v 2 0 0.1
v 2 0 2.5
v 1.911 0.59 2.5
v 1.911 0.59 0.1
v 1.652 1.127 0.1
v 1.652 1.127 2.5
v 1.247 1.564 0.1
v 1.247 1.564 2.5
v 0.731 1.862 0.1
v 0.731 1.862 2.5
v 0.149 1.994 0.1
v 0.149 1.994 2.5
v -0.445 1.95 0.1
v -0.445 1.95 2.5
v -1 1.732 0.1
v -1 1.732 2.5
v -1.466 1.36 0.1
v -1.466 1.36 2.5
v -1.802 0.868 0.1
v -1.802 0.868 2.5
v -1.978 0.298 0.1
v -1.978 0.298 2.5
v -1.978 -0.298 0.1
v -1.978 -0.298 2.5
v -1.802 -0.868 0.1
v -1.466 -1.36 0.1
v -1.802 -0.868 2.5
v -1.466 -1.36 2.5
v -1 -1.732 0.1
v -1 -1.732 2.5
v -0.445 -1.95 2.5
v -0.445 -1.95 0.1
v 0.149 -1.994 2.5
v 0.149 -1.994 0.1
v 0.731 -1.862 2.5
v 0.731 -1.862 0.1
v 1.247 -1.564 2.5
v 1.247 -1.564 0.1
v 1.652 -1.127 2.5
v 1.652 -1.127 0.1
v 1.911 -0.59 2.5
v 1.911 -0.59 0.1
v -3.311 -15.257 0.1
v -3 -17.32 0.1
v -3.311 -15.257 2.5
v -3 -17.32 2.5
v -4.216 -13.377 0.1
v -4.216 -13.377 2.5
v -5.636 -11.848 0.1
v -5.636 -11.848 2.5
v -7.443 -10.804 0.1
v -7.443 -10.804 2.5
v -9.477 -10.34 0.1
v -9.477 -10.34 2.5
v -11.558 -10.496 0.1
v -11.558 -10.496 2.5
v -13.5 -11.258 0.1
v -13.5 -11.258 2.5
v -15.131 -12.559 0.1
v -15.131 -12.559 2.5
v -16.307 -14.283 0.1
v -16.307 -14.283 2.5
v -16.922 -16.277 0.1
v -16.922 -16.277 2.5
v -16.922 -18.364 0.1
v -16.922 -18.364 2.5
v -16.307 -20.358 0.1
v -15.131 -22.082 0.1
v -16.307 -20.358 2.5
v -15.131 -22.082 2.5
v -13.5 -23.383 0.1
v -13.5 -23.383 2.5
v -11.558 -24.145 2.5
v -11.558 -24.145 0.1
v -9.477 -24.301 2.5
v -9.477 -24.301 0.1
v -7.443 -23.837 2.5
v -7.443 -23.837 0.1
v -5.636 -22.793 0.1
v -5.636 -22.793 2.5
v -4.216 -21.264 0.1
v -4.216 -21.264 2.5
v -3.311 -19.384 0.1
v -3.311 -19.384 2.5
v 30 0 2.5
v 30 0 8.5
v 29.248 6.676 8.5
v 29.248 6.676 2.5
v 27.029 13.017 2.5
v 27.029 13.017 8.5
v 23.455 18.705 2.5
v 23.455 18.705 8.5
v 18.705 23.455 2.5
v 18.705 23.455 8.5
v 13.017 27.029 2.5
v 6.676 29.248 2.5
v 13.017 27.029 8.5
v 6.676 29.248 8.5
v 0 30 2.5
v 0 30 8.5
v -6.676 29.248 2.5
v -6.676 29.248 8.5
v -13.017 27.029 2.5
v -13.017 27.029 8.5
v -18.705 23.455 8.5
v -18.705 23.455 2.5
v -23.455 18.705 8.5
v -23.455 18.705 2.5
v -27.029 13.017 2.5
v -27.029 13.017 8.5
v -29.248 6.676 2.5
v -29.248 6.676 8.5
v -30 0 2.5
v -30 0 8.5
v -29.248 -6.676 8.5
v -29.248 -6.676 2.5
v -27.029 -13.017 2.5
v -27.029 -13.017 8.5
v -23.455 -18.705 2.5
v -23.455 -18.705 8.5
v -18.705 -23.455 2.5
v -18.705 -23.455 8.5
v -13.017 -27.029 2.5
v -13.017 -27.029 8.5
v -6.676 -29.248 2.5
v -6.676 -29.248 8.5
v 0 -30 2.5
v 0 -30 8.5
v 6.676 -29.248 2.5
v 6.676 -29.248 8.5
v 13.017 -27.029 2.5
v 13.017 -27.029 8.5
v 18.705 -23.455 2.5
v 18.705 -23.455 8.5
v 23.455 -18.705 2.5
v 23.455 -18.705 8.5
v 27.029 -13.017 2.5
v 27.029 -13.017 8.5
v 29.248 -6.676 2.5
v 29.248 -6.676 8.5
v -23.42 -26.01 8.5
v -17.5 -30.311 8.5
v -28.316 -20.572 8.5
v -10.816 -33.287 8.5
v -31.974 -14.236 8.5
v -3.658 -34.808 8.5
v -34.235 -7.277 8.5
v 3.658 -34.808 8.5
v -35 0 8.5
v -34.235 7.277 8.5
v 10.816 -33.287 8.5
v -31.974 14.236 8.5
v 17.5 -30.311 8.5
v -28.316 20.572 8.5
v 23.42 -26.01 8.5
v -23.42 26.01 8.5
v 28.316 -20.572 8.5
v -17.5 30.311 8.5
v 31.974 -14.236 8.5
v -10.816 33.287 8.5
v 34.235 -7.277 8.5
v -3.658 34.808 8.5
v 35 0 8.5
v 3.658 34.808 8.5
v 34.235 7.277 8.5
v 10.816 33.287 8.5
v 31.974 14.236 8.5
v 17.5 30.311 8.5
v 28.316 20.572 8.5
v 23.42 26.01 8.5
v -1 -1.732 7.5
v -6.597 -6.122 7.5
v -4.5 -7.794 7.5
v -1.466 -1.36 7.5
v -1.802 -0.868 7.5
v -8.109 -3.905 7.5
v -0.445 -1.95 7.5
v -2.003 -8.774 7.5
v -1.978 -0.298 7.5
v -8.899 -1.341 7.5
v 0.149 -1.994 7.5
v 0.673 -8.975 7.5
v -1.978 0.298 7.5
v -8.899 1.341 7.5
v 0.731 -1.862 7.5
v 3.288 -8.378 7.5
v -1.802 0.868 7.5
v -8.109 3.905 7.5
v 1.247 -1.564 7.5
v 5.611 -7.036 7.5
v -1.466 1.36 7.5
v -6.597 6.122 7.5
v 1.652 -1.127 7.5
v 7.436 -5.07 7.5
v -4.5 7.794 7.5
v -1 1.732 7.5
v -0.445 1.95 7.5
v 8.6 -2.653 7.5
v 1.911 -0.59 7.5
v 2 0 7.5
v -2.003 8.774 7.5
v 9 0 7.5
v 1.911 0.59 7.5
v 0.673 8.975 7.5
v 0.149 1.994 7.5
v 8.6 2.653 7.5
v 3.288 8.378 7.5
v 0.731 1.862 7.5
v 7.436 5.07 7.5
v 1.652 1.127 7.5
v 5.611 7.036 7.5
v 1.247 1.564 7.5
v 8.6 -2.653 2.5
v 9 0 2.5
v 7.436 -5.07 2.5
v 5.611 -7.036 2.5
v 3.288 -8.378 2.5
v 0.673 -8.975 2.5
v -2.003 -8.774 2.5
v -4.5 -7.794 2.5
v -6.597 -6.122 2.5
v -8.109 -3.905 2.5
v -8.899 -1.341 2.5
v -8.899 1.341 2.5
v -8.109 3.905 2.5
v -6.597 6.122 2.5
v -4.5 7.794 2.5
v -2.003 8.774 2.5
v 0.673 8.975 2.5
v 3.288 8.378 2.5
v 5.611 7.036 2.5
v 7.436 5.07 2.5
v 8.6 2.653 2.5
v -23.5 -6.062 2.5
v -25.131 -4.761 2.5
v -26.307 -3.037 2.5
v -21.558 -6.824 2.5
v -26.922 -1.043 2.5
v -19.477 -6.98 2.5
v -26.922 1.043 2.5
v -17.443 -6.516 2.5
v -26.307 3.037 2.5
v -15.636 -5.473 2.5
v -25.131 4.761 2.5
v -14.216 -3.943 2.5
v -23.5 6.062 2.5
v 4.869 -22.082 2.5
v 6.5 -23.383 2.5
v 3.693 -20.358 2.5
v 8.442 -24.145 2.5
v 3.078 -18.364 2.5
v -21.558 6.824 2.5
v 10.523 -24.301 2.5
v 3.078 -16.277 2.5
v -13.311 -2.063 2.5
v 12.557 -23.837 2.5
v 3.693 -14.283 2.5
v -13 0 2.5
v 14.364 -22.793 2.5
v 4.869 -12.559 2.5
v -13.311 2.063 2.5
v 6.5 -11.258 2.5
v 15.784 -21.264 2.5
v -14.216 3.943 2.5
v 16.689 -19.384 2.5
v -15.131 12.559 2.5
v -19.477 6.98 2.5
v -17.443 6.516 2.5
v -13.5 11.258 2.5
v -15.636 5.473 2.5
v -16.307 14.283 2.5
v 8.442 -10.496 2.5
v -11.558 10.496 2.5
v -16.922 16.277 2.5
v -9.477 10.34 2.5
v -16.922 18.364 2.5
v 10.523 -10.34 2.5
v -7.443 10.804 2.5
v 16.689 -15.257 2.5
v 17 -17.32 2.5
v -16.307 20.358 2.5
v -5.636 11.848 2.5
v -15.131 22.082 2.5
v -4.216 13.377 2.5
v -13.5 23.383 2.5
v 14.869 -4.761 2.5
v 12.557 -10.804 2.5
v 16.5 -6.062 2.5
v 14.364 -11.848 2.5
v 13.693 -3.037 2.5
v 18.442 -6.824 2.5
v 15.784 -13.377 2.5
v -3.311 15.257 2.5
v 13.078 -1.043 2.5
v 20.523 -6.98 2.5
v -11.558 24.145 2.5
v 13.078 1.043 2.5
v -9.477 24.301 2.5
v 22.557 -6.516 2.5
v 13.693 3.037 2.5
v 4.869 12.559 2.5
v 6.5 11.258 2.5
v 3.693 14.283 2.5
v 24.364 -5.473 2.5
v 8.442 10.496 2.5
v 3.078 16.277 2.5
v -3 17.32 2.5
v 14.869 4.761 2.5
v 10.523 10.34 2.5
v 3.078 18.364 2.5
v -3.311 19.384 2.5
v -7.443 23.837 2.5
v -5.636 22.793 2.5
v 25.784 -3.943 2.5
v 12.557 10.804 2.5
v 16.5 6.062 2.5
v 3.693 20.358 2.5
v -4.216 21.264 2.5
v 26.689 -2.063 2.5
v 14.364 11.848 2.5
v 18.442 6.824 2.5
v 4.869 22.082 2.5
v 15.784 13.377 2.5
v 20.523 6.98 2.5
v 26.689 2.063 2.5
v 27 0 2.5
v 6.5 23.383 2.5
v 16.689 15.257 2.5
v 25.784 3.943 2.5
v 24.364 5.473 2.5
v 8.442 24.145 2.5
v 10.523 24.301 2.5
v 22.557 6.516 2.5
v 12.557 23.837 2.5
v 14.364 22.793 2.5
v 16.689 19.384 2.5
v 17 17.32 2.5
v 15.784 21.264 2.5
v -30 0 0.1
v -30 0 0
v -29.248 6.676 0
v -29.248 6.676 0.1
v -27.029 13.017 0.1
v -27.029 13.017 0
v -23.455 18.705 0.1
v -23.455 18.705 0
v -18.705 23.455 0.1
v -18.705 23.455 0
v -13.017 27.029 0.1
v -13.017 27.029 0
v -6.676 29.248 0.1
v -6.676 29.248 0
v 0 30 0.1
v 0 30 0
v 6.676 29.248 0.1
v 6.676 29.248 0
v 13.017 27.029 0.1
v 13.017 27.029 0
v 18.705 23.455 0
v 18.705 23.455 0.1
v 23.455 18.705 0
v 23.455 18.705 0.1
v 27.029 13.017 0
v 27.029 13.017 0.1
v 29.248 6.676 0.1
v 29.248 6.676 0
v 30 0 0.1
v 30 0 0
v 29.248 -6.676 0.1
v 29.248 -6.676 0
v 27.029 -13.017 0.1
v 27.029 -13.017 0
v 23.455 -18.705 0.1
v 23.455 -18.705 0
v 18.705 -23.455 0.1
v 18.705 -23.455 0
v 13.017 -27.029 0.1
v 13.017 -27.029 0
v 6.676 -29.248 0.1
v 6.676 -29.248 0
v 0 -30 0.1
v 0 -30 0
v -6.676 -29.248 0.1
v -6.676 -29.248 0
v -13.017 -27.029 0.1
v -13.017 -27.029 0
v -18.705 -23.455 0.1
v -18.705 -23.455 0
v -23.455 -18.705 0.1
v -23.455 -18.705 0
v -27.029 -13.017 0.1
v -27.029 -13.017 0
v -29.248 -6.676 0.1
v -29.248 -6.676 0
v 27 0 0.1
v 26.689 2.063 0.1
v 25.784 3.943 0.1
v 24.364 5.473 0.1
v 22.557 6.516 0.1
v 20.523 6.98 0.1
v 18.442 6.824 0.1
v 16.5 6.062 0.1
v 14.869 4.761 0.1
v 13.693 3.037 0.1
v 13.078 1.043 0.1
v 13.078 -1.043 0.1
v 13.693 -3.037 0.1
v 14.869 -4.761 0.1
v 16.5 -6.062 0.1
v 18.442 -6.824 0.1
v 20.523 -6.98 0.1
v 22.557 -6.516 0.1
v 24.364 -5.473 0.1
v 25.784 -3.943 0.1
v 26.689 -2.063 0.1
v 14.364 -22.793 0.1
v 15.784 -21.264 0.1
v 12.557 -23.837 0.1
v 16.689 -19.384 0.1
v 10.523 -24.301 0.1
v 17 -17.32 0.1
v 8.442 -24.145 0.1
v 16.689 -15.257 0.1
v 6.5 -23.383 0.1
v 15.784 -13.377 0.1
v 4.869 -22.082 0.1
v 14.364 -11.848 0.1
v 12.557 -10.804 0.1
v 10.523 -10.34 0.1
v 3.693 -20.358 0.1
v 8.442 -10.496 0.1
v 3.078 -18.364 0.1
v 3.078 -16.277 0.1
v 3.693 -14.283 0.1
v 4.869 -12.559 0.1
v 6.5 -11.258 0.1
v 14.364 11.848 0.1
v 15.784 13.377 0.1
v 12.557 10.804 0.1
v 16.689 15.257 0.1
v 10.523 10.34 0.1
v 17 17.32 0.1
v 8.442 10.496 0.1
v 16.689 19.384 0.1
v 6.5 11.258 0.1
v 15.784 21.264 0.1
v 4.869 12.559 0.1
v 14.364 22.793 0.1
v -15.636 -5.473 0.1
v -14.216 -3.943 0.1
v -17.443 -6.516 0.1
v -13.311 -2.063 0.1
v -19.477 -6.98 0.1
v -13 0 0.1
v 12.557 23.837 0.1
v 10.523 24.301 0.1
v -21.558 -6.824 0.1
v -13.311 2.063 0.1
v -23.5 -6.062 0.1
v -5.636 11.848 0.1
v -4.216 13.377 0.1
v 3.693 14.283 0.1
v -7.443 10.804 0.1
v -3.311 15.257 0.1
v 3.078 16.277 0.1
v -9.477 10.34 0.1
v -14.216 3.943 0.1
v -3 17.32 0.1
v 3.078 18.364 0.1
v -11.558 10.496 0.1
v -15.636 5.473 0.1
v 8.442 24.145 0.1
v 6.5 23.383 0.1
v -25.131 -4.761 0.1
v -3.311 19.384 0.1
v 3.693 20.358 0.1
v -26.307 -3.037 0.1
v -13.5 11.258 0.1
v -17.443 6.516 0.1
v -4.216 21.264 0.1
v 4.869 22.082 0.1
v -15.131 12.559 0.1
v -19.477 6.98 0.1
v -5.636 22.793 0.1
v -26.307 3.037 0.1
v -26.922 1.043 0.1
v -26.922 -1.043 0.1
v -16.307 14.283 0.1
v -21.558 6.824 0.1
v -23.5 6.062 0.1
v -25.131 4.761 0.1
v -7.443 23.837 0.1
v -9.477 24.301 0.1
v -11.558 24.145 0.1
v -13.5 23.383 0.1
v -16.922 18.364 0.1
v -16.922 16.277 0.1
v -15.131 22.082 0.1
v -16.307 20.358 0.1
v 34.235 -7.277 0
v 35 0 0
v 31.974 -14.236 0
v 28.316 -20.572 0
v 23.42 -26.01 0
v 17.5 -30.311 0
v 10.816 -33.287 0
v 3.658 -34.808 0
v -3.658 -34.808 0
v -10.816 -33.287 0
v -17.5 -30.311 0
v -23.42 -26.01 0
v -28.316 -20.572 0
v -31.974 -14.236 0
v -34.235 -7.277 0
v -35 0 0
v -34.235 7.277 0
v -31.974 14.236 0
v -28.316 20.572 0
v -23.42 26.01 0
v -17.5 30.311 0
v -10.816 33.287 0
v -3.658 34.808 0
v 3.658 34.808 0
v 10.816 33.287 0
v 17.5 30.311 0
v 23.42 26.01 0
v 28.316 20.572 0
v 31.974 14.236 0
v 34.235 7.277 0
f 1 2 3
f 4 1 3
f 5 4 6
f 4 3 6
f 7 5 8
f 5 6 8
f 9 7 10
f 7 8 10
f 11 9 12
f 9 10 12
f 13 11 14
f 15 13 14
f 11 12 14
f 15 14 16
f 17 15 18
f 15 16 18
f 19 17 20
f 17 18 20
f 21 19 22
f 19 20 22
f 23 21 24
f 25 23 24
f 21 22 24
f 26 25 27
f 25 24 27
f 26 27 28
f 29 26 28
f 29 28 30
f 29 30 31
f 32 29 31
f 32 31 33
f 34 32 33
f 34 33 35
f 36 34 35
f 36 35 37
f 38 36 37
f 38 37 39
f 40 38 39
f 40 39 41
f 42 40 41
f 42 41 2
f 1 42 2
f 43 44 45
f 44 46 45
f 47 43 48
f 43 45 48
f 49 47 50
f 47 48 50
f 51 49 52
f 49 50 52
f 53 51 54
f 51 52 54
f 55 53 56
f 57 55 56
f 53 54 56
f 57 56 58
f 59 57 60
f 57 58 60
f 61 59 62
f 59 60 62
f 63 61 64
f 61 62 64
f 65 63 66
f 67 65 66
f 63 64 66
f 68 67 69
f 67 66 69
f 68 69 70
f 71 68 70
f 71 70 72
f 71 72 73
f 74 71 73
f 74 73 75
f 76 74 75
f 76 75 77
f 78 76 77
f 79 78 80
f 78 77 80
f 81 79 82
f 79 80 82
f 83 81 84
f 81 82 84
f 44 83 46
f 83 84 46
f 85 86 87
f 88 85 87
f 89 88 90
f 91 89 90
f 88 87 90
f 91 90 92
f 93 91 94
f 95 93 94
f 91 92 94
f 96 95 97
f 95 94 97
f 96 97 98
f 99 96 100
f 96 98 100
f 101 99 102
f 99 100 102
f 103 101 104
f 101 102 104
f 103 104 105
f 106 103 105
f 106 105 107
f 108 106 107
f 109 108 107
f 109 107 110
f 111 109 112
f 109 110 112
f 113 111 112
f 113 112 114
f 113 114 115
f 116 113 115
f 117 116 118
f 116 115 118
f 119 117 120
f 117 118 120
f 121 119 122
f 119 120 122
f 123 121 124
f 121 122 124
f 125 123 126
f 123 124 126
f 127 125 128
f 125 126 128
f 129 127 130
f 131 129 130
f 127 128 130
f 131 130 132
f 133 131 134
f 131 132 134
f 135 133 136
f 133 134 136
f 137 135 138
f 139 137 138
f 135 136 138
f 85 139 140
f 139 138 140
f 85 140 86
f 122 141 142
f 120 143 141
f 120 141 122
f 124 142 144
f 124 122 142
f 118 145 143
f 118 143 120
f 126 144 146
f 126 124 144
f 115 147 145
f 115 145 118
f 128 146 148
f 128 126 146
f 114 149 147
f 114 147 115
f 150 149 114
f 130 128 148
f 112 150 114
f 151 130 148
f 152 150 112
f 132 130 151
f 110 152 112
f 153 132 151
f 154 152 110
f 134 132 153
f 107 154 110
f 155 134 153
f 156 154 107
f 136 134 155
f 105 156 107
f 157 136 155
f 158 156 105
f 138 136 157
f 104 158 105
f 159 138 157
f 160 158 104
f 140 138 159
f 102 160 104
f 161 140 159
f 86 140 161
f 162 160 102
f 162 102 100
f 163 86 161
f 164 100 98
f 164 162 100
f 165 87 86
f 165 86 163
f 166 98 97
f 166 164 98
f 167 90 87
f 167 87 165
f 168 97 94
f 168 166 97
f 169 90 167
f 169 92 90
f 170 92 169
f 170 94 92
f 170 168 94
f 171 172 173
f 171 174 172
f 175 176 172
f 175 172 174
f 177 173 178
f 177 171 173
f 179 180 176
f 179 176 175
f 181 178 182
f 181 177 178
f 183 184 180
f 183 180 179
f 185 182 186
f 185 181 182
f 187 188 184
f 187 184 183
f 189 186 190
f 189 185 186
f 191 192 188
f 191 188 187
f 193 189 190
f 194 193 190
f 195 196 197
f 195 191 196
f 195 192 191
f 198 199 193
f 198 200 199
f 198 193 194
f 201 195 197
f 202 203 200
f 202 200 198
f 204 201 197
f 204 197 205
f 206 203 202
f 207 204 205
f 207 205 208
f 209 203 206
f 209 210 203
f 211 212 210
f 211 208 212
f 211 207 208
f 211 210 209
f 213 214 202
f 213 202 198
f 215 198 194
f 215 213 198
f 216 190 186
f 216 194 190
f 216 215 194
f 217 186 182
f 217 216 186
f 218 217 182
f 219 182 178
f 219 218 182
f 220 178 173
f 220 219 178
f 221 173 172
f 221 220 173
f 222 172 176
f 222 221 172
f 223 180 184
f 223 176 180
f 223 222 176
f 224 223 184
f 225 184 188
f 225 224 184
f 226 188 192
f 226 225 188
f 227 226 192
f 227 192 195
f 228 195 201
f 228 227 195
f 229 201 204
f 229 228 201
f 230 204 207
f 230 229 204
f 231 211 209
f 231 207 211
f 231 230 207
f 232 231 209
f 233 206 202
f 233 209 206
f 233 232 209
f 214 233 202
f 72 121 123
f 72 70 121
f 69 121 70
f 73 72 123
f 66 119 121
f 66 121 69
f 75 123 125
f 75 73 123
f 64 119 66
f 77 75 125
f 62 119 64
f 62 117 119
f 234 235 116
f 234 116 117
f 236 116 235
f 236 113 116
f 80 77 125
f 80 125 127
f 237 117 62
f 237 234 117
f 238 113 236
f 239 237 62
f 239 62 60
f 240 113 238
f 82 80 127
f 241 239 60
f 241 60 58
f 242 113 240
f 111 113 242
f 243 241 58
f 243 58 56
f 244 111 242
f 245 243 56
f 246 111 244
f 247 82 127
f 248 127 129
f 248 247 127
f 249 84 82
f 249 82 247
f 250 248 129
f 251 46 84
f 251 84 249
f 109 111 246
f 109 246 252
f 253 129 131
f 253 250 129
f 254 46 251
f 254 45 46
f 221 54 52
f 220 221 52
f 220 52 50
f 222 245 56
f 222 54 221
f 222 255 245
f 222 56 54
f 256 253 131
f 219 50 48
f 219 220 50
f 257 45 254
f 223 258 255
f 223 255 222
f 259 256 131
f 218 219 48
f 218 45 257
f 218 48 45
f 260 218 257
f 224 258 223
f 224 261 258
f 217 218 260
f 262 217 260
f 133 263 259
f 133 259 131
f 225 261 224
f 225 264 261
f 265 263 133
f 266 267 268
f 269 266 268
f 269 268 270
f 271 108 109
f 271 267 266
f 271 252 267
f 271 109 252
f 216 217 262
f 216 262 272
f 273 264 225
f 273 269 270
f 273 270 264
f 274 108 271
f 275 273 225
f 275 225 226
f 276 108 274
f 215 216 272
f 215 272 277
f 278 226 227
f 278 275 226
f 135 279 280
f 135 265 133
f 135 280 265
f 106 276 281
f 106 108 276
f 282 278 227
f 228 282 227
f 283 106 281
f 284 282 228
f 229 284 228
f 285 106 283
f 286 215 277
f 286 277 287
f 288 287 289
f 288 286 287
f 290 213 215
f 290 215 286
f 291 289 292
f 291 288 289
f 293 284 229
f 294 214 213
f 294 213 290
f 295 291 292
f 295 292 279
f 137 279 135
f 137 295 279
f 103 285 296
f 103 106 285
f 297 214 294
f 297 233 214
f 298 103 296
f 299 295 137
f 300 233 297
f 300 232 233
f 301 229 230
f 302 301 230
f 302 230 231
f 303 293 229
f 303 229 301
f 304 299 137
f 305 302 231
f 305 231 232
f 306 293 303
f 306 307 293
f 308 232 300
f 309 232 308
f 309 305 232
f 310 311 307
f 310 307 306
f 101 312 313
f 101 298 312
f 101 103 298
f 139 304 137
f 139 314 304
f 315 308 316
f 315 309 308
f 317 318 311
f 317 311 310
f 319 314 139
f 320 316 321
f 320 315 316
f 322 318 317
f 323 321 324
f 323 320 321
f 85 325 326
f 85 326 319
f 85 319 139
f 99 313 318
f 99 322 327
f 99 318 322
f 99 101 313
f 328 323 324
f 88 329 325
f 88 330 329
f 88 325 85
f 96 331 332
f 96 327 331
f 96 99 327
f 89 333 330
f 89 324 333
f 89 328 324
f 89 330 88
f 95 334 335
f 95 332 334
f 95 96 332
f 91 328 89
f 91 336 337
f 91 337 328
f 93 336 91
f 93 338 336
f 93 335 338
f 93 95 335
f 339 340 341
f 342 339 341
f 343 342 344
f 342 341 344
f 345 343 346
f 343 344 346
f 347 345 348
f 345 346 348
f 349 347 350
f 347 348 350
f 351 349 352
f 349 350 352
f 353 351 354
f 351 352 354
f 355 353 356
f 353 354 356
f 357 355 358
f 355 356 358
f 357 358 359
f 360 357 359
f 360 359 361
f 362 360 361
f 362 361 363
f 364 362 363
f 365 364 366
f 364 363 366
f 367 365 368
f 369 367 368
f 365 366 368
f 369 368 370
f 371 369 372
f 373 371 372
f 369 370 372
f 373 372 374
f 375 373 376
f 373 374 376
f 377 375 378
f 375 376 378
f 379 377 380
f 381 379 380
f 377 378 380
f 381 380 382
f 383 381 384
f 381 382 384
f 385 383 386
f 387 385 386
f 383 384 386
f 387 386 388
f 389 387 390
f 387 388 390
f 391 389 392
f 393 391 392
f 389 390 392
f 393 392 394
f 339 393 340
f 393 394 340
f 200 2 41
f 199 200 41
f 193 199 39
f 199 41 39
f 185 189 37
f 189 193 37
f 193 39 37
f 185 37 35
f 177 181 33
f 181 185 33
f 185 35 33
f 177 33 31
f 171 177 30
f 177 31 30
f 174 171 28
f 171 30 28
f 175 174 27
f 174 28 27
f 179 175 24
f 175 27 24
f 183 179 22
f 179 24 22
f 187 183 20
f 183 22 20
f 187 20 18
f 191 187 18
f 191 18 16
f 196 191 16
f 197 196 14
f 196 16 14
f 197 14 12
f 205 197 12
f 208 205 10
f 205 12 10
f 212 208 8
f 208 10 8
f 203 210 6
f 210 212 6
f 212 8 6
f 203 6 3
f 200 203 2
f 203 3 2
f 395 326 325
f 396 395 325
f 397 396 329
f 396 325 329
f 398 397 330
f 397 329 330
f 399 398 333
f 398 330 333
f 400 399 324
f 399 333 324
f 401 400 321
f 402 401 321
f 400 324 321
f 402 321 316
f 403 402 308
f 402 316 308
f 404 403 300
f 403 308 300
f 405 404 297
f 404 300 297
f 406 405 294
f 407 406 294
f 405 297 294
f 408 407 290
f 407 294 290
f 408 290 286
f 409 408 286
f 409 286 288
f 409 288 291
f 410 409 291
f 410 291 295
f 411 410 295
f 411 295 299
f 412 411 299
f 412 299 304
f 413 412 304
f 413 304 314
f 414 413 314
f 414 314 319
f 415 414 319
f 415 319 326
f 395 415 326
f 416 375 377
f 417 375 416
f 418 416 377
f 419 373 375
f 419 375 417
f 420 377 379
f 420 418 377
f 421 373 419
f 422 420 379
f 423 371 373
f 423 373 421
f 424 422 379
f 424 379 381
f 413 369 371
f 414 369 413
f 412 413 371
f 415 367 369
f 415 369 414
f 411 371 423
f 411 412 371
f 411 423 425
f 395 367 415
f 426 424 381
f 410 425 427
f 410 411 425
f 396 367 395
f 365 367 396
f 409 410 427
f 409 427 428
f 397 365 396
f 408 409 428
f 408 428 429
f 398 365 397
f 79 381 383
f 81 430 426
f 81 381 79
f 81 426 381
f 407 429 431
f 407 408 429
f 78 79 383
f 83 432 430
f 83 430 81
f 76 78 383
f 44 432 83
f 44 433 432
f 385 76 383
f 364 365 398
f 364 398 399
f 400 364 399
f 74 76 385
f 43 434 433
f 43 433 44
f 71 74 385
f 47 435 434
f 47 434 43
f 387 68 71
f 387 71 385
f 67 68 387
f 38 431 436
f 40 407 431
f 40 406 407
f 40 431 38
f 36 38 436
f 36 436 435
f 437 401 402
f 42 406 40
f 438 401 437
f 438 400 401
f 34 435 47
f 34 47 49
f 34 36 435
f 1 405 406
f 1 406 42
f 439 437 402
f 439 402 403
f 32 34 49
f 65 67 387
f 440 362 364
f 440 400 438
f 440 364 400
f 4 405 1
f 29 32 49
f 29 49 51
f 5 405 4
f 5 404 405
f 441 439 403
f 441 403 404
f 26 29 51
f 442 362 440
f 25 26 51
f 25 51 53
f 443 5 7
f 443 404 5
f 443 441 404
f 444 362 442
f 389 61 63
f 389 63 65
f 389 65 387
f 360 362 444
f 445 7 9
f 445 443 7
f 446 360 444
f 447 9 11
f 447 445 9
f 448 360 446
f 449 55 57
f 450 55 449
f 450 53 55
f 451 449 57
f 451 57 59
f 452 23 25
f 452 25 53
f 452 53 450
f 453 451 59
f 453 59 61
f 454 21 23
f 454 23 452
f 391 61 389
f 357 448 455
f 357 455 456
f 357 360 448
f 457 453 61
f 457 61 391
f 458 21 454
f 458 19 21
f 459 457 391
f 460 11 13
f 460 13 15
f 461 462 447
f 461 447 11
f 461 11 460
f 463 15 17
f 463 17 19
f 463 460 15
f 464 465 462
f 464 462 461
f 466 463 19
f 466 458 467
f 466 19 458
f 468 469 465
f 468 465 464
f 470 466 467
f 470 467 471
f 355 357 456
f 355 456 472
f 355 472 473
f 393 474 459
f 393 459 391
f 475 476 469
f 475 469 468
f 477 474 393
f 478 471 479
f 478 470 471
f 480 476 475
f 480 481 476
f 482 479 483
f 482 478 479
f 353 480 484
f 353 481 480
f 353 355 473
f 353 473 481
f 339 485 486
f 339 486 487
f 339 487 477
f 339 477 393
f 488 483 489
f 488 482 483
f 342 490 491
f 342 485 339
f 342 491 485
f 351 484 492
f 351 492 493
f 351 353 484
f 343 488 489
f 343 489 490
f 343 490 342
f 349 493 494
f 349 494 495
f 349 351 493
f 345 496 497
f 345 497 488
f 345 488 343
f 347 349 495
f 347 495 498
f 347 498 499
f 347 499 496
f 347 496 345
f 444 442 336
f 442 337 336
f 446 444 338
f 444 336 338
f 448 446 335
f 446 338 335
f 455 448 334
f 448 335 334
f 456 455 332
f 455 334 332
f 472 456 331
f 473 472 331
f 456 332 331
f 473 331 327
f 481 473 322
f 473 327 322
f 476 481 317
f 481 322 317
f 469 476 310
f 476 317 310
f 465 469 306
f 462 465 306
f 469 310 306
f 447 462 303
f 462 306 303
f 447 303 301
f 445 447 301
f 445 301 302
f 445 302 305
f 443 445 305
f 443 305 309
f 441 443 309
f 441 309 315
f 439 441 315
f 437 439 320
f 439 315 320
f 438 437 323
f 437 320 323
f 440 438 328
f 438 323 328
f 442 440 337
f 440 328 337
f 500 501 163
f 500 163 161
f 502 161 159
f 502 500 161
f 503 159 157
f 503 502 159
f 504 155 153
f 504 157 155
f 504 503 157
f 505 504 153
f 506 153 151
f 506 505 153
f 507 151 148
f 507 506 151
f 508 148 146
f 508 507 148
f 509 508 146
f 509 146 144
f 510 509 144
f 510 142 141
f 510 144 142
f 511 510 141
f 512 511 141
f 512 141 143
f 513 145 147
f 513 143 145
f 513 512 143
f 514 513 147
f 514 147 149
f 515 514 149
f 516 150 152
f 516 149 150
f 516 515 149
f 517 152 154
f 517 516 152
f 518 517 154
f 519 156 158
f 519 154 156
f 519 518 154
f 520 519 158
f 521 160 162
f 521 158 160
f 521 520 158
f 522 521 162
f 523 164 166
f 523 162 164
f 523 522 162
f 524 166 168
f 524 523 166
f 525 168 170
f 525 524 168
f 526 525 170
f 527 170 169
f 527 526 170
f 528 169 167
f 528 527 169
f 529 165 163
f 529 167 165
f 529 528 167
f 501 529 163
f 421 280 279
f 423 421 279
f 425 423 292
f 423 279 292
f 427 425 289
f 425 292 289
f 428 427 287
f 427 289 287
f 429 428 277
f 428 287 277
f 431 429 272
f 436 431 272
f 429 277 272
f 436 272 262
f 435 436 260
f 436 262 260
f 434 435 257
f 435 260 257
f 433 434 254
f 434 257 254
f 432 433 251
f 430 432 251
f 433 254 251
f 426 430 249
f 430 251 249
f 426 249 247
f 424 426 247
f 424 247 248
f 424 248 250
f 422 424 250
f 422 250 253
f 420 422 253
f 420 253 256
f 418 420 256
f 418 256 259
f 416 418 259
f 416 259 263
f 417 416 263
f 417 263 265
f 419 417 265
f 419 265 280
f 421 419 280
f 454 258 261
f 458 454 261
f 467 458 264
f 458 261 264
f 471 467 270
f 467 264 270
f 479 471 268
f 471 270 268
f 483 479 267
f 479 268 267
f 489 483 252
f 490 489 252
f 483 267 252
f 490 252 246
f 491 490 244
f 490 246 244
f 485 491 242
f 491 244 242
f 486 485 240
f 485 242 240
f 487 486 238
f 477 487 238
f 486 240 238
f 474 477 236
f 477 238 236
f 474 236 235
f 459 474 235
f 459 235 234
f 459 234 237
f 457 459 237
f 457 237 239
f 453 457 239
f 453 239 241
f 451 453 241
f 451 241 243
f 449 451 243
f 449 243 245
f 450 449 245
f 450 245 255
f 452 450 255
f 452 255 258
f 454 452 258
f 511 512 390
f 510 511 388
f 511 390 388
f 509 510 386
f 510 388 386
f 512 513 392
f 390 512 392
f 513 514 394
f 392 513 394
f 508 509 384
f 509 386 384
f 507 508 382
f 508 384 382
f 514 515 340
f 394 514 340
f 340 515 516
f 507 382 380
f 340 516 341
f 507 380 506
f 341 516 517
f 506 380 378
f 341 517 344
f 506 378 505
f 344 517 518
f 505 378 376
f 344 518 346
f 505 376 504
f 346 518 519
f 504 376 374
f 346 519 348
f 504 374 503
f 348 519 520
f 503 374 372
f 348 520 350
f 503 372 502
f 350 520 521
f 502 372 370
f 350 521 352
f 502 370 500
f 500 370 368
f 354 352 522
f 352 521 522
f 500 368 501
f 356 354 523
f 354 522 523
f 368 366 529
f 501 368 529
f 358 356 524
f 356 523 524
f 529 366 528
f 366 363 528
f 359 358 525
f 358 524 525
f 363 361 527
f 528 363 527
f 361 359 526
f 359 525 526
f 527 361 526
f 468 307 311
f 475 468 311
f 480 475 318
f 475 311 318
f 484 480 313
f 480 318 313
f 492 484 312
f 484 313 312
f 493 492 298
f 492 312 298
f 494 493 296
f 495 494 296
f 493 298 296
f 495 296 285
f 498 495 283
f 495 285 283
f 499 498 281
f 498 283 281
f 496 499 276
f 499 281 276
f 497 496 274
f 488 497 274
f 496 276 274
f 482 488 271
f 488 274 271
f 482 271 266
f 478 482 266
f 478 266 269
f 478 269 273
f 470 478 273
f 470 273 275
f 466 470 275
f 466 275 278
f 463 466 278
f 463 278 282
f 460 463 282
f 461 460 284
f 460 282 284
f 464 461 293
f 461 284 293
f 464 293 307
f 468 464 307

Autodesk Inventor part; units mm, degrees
ref_plane "YZ Plane" through (0, 0, 0) normal (1, 0, 0) x (0, 1, 0)
ref_plane "XZ Plane" through (0, 0, 0) normal (0, 1, 0) x (-1, 0, 0)
ref_plane "XY Plane" through (0, 0, 0) normal (0, 0, 1) x (1, 0, 0)
sketch "スケッチ1" plane through (0, 0, 0) normal (0, 0, 1) x (1, 0, 0)
  circle A0 centre (0, 0) radius 35
  dimension "d0" = 70
extrude "押し出し1" add sketch "スケッチ1" along normal blind 8.5
sketch "スケッチ2" plane through (0, 0, 8.5) normal (0, 0, 1) x (1, 0, 0)
  circle A0 centre (0, 0) radius 35 projected
  circle A1 centre (0, 0) radius 30
  dimension "d3" = 5
extrude "押し出し2" cut sketch "スケッチ2" against normal blind 6 contours A1
sketch "スケッチ3" plane through (0, 0, 2.5) normal (0, 0, 1) x (1, 0, 0)
  circle A0 centre (0, 0) radius 2
  circle A1 centre (0, 0) radius 9
  dimension "d7" = 4
  dimension "d8" = 18
extrude "押し出し3" add sketch "スケッチ3" along normal blind 5
extrude "押し出し4" cut sketch "スケッチ3" against normal blind 5 contours A0
sketch "スケッチ4" plane through (0, 0, 2.5) normal (0, 0, 1) x (1, 0, 0)
  circle A0 centre (20, 0) radius 7
  circle A1 centre (10, 17.3205) radius 7
  circle A2 centre (-10, 17.3205) radius 7
  circle A3 centre (-20, 0) radius 7
  circle A4 centre (-10, -17.3205) radius 7
  circle A5 centre (10, -17.3205) radius 7
  point P0 (0, 0)
  dimension "d14" = 14
  dimension "d15" = 20
  dimension "d18" = 360
extrude "押し出し5" cut sketch "スケッチ4" against normal blind 5
sketch "スケッチ5" plane through (0, 0, 0) normal (0, 0, -1) x (-1, 0, 0)
  circle A0 centre (0, 0) radius 2 projected
  circle A1 centre (0, 0) radius 30
extrude "押し出し6" cut sketch "スケッチ5" against normal blind 0.1
properties part number "20220524_70アルミホイール"
